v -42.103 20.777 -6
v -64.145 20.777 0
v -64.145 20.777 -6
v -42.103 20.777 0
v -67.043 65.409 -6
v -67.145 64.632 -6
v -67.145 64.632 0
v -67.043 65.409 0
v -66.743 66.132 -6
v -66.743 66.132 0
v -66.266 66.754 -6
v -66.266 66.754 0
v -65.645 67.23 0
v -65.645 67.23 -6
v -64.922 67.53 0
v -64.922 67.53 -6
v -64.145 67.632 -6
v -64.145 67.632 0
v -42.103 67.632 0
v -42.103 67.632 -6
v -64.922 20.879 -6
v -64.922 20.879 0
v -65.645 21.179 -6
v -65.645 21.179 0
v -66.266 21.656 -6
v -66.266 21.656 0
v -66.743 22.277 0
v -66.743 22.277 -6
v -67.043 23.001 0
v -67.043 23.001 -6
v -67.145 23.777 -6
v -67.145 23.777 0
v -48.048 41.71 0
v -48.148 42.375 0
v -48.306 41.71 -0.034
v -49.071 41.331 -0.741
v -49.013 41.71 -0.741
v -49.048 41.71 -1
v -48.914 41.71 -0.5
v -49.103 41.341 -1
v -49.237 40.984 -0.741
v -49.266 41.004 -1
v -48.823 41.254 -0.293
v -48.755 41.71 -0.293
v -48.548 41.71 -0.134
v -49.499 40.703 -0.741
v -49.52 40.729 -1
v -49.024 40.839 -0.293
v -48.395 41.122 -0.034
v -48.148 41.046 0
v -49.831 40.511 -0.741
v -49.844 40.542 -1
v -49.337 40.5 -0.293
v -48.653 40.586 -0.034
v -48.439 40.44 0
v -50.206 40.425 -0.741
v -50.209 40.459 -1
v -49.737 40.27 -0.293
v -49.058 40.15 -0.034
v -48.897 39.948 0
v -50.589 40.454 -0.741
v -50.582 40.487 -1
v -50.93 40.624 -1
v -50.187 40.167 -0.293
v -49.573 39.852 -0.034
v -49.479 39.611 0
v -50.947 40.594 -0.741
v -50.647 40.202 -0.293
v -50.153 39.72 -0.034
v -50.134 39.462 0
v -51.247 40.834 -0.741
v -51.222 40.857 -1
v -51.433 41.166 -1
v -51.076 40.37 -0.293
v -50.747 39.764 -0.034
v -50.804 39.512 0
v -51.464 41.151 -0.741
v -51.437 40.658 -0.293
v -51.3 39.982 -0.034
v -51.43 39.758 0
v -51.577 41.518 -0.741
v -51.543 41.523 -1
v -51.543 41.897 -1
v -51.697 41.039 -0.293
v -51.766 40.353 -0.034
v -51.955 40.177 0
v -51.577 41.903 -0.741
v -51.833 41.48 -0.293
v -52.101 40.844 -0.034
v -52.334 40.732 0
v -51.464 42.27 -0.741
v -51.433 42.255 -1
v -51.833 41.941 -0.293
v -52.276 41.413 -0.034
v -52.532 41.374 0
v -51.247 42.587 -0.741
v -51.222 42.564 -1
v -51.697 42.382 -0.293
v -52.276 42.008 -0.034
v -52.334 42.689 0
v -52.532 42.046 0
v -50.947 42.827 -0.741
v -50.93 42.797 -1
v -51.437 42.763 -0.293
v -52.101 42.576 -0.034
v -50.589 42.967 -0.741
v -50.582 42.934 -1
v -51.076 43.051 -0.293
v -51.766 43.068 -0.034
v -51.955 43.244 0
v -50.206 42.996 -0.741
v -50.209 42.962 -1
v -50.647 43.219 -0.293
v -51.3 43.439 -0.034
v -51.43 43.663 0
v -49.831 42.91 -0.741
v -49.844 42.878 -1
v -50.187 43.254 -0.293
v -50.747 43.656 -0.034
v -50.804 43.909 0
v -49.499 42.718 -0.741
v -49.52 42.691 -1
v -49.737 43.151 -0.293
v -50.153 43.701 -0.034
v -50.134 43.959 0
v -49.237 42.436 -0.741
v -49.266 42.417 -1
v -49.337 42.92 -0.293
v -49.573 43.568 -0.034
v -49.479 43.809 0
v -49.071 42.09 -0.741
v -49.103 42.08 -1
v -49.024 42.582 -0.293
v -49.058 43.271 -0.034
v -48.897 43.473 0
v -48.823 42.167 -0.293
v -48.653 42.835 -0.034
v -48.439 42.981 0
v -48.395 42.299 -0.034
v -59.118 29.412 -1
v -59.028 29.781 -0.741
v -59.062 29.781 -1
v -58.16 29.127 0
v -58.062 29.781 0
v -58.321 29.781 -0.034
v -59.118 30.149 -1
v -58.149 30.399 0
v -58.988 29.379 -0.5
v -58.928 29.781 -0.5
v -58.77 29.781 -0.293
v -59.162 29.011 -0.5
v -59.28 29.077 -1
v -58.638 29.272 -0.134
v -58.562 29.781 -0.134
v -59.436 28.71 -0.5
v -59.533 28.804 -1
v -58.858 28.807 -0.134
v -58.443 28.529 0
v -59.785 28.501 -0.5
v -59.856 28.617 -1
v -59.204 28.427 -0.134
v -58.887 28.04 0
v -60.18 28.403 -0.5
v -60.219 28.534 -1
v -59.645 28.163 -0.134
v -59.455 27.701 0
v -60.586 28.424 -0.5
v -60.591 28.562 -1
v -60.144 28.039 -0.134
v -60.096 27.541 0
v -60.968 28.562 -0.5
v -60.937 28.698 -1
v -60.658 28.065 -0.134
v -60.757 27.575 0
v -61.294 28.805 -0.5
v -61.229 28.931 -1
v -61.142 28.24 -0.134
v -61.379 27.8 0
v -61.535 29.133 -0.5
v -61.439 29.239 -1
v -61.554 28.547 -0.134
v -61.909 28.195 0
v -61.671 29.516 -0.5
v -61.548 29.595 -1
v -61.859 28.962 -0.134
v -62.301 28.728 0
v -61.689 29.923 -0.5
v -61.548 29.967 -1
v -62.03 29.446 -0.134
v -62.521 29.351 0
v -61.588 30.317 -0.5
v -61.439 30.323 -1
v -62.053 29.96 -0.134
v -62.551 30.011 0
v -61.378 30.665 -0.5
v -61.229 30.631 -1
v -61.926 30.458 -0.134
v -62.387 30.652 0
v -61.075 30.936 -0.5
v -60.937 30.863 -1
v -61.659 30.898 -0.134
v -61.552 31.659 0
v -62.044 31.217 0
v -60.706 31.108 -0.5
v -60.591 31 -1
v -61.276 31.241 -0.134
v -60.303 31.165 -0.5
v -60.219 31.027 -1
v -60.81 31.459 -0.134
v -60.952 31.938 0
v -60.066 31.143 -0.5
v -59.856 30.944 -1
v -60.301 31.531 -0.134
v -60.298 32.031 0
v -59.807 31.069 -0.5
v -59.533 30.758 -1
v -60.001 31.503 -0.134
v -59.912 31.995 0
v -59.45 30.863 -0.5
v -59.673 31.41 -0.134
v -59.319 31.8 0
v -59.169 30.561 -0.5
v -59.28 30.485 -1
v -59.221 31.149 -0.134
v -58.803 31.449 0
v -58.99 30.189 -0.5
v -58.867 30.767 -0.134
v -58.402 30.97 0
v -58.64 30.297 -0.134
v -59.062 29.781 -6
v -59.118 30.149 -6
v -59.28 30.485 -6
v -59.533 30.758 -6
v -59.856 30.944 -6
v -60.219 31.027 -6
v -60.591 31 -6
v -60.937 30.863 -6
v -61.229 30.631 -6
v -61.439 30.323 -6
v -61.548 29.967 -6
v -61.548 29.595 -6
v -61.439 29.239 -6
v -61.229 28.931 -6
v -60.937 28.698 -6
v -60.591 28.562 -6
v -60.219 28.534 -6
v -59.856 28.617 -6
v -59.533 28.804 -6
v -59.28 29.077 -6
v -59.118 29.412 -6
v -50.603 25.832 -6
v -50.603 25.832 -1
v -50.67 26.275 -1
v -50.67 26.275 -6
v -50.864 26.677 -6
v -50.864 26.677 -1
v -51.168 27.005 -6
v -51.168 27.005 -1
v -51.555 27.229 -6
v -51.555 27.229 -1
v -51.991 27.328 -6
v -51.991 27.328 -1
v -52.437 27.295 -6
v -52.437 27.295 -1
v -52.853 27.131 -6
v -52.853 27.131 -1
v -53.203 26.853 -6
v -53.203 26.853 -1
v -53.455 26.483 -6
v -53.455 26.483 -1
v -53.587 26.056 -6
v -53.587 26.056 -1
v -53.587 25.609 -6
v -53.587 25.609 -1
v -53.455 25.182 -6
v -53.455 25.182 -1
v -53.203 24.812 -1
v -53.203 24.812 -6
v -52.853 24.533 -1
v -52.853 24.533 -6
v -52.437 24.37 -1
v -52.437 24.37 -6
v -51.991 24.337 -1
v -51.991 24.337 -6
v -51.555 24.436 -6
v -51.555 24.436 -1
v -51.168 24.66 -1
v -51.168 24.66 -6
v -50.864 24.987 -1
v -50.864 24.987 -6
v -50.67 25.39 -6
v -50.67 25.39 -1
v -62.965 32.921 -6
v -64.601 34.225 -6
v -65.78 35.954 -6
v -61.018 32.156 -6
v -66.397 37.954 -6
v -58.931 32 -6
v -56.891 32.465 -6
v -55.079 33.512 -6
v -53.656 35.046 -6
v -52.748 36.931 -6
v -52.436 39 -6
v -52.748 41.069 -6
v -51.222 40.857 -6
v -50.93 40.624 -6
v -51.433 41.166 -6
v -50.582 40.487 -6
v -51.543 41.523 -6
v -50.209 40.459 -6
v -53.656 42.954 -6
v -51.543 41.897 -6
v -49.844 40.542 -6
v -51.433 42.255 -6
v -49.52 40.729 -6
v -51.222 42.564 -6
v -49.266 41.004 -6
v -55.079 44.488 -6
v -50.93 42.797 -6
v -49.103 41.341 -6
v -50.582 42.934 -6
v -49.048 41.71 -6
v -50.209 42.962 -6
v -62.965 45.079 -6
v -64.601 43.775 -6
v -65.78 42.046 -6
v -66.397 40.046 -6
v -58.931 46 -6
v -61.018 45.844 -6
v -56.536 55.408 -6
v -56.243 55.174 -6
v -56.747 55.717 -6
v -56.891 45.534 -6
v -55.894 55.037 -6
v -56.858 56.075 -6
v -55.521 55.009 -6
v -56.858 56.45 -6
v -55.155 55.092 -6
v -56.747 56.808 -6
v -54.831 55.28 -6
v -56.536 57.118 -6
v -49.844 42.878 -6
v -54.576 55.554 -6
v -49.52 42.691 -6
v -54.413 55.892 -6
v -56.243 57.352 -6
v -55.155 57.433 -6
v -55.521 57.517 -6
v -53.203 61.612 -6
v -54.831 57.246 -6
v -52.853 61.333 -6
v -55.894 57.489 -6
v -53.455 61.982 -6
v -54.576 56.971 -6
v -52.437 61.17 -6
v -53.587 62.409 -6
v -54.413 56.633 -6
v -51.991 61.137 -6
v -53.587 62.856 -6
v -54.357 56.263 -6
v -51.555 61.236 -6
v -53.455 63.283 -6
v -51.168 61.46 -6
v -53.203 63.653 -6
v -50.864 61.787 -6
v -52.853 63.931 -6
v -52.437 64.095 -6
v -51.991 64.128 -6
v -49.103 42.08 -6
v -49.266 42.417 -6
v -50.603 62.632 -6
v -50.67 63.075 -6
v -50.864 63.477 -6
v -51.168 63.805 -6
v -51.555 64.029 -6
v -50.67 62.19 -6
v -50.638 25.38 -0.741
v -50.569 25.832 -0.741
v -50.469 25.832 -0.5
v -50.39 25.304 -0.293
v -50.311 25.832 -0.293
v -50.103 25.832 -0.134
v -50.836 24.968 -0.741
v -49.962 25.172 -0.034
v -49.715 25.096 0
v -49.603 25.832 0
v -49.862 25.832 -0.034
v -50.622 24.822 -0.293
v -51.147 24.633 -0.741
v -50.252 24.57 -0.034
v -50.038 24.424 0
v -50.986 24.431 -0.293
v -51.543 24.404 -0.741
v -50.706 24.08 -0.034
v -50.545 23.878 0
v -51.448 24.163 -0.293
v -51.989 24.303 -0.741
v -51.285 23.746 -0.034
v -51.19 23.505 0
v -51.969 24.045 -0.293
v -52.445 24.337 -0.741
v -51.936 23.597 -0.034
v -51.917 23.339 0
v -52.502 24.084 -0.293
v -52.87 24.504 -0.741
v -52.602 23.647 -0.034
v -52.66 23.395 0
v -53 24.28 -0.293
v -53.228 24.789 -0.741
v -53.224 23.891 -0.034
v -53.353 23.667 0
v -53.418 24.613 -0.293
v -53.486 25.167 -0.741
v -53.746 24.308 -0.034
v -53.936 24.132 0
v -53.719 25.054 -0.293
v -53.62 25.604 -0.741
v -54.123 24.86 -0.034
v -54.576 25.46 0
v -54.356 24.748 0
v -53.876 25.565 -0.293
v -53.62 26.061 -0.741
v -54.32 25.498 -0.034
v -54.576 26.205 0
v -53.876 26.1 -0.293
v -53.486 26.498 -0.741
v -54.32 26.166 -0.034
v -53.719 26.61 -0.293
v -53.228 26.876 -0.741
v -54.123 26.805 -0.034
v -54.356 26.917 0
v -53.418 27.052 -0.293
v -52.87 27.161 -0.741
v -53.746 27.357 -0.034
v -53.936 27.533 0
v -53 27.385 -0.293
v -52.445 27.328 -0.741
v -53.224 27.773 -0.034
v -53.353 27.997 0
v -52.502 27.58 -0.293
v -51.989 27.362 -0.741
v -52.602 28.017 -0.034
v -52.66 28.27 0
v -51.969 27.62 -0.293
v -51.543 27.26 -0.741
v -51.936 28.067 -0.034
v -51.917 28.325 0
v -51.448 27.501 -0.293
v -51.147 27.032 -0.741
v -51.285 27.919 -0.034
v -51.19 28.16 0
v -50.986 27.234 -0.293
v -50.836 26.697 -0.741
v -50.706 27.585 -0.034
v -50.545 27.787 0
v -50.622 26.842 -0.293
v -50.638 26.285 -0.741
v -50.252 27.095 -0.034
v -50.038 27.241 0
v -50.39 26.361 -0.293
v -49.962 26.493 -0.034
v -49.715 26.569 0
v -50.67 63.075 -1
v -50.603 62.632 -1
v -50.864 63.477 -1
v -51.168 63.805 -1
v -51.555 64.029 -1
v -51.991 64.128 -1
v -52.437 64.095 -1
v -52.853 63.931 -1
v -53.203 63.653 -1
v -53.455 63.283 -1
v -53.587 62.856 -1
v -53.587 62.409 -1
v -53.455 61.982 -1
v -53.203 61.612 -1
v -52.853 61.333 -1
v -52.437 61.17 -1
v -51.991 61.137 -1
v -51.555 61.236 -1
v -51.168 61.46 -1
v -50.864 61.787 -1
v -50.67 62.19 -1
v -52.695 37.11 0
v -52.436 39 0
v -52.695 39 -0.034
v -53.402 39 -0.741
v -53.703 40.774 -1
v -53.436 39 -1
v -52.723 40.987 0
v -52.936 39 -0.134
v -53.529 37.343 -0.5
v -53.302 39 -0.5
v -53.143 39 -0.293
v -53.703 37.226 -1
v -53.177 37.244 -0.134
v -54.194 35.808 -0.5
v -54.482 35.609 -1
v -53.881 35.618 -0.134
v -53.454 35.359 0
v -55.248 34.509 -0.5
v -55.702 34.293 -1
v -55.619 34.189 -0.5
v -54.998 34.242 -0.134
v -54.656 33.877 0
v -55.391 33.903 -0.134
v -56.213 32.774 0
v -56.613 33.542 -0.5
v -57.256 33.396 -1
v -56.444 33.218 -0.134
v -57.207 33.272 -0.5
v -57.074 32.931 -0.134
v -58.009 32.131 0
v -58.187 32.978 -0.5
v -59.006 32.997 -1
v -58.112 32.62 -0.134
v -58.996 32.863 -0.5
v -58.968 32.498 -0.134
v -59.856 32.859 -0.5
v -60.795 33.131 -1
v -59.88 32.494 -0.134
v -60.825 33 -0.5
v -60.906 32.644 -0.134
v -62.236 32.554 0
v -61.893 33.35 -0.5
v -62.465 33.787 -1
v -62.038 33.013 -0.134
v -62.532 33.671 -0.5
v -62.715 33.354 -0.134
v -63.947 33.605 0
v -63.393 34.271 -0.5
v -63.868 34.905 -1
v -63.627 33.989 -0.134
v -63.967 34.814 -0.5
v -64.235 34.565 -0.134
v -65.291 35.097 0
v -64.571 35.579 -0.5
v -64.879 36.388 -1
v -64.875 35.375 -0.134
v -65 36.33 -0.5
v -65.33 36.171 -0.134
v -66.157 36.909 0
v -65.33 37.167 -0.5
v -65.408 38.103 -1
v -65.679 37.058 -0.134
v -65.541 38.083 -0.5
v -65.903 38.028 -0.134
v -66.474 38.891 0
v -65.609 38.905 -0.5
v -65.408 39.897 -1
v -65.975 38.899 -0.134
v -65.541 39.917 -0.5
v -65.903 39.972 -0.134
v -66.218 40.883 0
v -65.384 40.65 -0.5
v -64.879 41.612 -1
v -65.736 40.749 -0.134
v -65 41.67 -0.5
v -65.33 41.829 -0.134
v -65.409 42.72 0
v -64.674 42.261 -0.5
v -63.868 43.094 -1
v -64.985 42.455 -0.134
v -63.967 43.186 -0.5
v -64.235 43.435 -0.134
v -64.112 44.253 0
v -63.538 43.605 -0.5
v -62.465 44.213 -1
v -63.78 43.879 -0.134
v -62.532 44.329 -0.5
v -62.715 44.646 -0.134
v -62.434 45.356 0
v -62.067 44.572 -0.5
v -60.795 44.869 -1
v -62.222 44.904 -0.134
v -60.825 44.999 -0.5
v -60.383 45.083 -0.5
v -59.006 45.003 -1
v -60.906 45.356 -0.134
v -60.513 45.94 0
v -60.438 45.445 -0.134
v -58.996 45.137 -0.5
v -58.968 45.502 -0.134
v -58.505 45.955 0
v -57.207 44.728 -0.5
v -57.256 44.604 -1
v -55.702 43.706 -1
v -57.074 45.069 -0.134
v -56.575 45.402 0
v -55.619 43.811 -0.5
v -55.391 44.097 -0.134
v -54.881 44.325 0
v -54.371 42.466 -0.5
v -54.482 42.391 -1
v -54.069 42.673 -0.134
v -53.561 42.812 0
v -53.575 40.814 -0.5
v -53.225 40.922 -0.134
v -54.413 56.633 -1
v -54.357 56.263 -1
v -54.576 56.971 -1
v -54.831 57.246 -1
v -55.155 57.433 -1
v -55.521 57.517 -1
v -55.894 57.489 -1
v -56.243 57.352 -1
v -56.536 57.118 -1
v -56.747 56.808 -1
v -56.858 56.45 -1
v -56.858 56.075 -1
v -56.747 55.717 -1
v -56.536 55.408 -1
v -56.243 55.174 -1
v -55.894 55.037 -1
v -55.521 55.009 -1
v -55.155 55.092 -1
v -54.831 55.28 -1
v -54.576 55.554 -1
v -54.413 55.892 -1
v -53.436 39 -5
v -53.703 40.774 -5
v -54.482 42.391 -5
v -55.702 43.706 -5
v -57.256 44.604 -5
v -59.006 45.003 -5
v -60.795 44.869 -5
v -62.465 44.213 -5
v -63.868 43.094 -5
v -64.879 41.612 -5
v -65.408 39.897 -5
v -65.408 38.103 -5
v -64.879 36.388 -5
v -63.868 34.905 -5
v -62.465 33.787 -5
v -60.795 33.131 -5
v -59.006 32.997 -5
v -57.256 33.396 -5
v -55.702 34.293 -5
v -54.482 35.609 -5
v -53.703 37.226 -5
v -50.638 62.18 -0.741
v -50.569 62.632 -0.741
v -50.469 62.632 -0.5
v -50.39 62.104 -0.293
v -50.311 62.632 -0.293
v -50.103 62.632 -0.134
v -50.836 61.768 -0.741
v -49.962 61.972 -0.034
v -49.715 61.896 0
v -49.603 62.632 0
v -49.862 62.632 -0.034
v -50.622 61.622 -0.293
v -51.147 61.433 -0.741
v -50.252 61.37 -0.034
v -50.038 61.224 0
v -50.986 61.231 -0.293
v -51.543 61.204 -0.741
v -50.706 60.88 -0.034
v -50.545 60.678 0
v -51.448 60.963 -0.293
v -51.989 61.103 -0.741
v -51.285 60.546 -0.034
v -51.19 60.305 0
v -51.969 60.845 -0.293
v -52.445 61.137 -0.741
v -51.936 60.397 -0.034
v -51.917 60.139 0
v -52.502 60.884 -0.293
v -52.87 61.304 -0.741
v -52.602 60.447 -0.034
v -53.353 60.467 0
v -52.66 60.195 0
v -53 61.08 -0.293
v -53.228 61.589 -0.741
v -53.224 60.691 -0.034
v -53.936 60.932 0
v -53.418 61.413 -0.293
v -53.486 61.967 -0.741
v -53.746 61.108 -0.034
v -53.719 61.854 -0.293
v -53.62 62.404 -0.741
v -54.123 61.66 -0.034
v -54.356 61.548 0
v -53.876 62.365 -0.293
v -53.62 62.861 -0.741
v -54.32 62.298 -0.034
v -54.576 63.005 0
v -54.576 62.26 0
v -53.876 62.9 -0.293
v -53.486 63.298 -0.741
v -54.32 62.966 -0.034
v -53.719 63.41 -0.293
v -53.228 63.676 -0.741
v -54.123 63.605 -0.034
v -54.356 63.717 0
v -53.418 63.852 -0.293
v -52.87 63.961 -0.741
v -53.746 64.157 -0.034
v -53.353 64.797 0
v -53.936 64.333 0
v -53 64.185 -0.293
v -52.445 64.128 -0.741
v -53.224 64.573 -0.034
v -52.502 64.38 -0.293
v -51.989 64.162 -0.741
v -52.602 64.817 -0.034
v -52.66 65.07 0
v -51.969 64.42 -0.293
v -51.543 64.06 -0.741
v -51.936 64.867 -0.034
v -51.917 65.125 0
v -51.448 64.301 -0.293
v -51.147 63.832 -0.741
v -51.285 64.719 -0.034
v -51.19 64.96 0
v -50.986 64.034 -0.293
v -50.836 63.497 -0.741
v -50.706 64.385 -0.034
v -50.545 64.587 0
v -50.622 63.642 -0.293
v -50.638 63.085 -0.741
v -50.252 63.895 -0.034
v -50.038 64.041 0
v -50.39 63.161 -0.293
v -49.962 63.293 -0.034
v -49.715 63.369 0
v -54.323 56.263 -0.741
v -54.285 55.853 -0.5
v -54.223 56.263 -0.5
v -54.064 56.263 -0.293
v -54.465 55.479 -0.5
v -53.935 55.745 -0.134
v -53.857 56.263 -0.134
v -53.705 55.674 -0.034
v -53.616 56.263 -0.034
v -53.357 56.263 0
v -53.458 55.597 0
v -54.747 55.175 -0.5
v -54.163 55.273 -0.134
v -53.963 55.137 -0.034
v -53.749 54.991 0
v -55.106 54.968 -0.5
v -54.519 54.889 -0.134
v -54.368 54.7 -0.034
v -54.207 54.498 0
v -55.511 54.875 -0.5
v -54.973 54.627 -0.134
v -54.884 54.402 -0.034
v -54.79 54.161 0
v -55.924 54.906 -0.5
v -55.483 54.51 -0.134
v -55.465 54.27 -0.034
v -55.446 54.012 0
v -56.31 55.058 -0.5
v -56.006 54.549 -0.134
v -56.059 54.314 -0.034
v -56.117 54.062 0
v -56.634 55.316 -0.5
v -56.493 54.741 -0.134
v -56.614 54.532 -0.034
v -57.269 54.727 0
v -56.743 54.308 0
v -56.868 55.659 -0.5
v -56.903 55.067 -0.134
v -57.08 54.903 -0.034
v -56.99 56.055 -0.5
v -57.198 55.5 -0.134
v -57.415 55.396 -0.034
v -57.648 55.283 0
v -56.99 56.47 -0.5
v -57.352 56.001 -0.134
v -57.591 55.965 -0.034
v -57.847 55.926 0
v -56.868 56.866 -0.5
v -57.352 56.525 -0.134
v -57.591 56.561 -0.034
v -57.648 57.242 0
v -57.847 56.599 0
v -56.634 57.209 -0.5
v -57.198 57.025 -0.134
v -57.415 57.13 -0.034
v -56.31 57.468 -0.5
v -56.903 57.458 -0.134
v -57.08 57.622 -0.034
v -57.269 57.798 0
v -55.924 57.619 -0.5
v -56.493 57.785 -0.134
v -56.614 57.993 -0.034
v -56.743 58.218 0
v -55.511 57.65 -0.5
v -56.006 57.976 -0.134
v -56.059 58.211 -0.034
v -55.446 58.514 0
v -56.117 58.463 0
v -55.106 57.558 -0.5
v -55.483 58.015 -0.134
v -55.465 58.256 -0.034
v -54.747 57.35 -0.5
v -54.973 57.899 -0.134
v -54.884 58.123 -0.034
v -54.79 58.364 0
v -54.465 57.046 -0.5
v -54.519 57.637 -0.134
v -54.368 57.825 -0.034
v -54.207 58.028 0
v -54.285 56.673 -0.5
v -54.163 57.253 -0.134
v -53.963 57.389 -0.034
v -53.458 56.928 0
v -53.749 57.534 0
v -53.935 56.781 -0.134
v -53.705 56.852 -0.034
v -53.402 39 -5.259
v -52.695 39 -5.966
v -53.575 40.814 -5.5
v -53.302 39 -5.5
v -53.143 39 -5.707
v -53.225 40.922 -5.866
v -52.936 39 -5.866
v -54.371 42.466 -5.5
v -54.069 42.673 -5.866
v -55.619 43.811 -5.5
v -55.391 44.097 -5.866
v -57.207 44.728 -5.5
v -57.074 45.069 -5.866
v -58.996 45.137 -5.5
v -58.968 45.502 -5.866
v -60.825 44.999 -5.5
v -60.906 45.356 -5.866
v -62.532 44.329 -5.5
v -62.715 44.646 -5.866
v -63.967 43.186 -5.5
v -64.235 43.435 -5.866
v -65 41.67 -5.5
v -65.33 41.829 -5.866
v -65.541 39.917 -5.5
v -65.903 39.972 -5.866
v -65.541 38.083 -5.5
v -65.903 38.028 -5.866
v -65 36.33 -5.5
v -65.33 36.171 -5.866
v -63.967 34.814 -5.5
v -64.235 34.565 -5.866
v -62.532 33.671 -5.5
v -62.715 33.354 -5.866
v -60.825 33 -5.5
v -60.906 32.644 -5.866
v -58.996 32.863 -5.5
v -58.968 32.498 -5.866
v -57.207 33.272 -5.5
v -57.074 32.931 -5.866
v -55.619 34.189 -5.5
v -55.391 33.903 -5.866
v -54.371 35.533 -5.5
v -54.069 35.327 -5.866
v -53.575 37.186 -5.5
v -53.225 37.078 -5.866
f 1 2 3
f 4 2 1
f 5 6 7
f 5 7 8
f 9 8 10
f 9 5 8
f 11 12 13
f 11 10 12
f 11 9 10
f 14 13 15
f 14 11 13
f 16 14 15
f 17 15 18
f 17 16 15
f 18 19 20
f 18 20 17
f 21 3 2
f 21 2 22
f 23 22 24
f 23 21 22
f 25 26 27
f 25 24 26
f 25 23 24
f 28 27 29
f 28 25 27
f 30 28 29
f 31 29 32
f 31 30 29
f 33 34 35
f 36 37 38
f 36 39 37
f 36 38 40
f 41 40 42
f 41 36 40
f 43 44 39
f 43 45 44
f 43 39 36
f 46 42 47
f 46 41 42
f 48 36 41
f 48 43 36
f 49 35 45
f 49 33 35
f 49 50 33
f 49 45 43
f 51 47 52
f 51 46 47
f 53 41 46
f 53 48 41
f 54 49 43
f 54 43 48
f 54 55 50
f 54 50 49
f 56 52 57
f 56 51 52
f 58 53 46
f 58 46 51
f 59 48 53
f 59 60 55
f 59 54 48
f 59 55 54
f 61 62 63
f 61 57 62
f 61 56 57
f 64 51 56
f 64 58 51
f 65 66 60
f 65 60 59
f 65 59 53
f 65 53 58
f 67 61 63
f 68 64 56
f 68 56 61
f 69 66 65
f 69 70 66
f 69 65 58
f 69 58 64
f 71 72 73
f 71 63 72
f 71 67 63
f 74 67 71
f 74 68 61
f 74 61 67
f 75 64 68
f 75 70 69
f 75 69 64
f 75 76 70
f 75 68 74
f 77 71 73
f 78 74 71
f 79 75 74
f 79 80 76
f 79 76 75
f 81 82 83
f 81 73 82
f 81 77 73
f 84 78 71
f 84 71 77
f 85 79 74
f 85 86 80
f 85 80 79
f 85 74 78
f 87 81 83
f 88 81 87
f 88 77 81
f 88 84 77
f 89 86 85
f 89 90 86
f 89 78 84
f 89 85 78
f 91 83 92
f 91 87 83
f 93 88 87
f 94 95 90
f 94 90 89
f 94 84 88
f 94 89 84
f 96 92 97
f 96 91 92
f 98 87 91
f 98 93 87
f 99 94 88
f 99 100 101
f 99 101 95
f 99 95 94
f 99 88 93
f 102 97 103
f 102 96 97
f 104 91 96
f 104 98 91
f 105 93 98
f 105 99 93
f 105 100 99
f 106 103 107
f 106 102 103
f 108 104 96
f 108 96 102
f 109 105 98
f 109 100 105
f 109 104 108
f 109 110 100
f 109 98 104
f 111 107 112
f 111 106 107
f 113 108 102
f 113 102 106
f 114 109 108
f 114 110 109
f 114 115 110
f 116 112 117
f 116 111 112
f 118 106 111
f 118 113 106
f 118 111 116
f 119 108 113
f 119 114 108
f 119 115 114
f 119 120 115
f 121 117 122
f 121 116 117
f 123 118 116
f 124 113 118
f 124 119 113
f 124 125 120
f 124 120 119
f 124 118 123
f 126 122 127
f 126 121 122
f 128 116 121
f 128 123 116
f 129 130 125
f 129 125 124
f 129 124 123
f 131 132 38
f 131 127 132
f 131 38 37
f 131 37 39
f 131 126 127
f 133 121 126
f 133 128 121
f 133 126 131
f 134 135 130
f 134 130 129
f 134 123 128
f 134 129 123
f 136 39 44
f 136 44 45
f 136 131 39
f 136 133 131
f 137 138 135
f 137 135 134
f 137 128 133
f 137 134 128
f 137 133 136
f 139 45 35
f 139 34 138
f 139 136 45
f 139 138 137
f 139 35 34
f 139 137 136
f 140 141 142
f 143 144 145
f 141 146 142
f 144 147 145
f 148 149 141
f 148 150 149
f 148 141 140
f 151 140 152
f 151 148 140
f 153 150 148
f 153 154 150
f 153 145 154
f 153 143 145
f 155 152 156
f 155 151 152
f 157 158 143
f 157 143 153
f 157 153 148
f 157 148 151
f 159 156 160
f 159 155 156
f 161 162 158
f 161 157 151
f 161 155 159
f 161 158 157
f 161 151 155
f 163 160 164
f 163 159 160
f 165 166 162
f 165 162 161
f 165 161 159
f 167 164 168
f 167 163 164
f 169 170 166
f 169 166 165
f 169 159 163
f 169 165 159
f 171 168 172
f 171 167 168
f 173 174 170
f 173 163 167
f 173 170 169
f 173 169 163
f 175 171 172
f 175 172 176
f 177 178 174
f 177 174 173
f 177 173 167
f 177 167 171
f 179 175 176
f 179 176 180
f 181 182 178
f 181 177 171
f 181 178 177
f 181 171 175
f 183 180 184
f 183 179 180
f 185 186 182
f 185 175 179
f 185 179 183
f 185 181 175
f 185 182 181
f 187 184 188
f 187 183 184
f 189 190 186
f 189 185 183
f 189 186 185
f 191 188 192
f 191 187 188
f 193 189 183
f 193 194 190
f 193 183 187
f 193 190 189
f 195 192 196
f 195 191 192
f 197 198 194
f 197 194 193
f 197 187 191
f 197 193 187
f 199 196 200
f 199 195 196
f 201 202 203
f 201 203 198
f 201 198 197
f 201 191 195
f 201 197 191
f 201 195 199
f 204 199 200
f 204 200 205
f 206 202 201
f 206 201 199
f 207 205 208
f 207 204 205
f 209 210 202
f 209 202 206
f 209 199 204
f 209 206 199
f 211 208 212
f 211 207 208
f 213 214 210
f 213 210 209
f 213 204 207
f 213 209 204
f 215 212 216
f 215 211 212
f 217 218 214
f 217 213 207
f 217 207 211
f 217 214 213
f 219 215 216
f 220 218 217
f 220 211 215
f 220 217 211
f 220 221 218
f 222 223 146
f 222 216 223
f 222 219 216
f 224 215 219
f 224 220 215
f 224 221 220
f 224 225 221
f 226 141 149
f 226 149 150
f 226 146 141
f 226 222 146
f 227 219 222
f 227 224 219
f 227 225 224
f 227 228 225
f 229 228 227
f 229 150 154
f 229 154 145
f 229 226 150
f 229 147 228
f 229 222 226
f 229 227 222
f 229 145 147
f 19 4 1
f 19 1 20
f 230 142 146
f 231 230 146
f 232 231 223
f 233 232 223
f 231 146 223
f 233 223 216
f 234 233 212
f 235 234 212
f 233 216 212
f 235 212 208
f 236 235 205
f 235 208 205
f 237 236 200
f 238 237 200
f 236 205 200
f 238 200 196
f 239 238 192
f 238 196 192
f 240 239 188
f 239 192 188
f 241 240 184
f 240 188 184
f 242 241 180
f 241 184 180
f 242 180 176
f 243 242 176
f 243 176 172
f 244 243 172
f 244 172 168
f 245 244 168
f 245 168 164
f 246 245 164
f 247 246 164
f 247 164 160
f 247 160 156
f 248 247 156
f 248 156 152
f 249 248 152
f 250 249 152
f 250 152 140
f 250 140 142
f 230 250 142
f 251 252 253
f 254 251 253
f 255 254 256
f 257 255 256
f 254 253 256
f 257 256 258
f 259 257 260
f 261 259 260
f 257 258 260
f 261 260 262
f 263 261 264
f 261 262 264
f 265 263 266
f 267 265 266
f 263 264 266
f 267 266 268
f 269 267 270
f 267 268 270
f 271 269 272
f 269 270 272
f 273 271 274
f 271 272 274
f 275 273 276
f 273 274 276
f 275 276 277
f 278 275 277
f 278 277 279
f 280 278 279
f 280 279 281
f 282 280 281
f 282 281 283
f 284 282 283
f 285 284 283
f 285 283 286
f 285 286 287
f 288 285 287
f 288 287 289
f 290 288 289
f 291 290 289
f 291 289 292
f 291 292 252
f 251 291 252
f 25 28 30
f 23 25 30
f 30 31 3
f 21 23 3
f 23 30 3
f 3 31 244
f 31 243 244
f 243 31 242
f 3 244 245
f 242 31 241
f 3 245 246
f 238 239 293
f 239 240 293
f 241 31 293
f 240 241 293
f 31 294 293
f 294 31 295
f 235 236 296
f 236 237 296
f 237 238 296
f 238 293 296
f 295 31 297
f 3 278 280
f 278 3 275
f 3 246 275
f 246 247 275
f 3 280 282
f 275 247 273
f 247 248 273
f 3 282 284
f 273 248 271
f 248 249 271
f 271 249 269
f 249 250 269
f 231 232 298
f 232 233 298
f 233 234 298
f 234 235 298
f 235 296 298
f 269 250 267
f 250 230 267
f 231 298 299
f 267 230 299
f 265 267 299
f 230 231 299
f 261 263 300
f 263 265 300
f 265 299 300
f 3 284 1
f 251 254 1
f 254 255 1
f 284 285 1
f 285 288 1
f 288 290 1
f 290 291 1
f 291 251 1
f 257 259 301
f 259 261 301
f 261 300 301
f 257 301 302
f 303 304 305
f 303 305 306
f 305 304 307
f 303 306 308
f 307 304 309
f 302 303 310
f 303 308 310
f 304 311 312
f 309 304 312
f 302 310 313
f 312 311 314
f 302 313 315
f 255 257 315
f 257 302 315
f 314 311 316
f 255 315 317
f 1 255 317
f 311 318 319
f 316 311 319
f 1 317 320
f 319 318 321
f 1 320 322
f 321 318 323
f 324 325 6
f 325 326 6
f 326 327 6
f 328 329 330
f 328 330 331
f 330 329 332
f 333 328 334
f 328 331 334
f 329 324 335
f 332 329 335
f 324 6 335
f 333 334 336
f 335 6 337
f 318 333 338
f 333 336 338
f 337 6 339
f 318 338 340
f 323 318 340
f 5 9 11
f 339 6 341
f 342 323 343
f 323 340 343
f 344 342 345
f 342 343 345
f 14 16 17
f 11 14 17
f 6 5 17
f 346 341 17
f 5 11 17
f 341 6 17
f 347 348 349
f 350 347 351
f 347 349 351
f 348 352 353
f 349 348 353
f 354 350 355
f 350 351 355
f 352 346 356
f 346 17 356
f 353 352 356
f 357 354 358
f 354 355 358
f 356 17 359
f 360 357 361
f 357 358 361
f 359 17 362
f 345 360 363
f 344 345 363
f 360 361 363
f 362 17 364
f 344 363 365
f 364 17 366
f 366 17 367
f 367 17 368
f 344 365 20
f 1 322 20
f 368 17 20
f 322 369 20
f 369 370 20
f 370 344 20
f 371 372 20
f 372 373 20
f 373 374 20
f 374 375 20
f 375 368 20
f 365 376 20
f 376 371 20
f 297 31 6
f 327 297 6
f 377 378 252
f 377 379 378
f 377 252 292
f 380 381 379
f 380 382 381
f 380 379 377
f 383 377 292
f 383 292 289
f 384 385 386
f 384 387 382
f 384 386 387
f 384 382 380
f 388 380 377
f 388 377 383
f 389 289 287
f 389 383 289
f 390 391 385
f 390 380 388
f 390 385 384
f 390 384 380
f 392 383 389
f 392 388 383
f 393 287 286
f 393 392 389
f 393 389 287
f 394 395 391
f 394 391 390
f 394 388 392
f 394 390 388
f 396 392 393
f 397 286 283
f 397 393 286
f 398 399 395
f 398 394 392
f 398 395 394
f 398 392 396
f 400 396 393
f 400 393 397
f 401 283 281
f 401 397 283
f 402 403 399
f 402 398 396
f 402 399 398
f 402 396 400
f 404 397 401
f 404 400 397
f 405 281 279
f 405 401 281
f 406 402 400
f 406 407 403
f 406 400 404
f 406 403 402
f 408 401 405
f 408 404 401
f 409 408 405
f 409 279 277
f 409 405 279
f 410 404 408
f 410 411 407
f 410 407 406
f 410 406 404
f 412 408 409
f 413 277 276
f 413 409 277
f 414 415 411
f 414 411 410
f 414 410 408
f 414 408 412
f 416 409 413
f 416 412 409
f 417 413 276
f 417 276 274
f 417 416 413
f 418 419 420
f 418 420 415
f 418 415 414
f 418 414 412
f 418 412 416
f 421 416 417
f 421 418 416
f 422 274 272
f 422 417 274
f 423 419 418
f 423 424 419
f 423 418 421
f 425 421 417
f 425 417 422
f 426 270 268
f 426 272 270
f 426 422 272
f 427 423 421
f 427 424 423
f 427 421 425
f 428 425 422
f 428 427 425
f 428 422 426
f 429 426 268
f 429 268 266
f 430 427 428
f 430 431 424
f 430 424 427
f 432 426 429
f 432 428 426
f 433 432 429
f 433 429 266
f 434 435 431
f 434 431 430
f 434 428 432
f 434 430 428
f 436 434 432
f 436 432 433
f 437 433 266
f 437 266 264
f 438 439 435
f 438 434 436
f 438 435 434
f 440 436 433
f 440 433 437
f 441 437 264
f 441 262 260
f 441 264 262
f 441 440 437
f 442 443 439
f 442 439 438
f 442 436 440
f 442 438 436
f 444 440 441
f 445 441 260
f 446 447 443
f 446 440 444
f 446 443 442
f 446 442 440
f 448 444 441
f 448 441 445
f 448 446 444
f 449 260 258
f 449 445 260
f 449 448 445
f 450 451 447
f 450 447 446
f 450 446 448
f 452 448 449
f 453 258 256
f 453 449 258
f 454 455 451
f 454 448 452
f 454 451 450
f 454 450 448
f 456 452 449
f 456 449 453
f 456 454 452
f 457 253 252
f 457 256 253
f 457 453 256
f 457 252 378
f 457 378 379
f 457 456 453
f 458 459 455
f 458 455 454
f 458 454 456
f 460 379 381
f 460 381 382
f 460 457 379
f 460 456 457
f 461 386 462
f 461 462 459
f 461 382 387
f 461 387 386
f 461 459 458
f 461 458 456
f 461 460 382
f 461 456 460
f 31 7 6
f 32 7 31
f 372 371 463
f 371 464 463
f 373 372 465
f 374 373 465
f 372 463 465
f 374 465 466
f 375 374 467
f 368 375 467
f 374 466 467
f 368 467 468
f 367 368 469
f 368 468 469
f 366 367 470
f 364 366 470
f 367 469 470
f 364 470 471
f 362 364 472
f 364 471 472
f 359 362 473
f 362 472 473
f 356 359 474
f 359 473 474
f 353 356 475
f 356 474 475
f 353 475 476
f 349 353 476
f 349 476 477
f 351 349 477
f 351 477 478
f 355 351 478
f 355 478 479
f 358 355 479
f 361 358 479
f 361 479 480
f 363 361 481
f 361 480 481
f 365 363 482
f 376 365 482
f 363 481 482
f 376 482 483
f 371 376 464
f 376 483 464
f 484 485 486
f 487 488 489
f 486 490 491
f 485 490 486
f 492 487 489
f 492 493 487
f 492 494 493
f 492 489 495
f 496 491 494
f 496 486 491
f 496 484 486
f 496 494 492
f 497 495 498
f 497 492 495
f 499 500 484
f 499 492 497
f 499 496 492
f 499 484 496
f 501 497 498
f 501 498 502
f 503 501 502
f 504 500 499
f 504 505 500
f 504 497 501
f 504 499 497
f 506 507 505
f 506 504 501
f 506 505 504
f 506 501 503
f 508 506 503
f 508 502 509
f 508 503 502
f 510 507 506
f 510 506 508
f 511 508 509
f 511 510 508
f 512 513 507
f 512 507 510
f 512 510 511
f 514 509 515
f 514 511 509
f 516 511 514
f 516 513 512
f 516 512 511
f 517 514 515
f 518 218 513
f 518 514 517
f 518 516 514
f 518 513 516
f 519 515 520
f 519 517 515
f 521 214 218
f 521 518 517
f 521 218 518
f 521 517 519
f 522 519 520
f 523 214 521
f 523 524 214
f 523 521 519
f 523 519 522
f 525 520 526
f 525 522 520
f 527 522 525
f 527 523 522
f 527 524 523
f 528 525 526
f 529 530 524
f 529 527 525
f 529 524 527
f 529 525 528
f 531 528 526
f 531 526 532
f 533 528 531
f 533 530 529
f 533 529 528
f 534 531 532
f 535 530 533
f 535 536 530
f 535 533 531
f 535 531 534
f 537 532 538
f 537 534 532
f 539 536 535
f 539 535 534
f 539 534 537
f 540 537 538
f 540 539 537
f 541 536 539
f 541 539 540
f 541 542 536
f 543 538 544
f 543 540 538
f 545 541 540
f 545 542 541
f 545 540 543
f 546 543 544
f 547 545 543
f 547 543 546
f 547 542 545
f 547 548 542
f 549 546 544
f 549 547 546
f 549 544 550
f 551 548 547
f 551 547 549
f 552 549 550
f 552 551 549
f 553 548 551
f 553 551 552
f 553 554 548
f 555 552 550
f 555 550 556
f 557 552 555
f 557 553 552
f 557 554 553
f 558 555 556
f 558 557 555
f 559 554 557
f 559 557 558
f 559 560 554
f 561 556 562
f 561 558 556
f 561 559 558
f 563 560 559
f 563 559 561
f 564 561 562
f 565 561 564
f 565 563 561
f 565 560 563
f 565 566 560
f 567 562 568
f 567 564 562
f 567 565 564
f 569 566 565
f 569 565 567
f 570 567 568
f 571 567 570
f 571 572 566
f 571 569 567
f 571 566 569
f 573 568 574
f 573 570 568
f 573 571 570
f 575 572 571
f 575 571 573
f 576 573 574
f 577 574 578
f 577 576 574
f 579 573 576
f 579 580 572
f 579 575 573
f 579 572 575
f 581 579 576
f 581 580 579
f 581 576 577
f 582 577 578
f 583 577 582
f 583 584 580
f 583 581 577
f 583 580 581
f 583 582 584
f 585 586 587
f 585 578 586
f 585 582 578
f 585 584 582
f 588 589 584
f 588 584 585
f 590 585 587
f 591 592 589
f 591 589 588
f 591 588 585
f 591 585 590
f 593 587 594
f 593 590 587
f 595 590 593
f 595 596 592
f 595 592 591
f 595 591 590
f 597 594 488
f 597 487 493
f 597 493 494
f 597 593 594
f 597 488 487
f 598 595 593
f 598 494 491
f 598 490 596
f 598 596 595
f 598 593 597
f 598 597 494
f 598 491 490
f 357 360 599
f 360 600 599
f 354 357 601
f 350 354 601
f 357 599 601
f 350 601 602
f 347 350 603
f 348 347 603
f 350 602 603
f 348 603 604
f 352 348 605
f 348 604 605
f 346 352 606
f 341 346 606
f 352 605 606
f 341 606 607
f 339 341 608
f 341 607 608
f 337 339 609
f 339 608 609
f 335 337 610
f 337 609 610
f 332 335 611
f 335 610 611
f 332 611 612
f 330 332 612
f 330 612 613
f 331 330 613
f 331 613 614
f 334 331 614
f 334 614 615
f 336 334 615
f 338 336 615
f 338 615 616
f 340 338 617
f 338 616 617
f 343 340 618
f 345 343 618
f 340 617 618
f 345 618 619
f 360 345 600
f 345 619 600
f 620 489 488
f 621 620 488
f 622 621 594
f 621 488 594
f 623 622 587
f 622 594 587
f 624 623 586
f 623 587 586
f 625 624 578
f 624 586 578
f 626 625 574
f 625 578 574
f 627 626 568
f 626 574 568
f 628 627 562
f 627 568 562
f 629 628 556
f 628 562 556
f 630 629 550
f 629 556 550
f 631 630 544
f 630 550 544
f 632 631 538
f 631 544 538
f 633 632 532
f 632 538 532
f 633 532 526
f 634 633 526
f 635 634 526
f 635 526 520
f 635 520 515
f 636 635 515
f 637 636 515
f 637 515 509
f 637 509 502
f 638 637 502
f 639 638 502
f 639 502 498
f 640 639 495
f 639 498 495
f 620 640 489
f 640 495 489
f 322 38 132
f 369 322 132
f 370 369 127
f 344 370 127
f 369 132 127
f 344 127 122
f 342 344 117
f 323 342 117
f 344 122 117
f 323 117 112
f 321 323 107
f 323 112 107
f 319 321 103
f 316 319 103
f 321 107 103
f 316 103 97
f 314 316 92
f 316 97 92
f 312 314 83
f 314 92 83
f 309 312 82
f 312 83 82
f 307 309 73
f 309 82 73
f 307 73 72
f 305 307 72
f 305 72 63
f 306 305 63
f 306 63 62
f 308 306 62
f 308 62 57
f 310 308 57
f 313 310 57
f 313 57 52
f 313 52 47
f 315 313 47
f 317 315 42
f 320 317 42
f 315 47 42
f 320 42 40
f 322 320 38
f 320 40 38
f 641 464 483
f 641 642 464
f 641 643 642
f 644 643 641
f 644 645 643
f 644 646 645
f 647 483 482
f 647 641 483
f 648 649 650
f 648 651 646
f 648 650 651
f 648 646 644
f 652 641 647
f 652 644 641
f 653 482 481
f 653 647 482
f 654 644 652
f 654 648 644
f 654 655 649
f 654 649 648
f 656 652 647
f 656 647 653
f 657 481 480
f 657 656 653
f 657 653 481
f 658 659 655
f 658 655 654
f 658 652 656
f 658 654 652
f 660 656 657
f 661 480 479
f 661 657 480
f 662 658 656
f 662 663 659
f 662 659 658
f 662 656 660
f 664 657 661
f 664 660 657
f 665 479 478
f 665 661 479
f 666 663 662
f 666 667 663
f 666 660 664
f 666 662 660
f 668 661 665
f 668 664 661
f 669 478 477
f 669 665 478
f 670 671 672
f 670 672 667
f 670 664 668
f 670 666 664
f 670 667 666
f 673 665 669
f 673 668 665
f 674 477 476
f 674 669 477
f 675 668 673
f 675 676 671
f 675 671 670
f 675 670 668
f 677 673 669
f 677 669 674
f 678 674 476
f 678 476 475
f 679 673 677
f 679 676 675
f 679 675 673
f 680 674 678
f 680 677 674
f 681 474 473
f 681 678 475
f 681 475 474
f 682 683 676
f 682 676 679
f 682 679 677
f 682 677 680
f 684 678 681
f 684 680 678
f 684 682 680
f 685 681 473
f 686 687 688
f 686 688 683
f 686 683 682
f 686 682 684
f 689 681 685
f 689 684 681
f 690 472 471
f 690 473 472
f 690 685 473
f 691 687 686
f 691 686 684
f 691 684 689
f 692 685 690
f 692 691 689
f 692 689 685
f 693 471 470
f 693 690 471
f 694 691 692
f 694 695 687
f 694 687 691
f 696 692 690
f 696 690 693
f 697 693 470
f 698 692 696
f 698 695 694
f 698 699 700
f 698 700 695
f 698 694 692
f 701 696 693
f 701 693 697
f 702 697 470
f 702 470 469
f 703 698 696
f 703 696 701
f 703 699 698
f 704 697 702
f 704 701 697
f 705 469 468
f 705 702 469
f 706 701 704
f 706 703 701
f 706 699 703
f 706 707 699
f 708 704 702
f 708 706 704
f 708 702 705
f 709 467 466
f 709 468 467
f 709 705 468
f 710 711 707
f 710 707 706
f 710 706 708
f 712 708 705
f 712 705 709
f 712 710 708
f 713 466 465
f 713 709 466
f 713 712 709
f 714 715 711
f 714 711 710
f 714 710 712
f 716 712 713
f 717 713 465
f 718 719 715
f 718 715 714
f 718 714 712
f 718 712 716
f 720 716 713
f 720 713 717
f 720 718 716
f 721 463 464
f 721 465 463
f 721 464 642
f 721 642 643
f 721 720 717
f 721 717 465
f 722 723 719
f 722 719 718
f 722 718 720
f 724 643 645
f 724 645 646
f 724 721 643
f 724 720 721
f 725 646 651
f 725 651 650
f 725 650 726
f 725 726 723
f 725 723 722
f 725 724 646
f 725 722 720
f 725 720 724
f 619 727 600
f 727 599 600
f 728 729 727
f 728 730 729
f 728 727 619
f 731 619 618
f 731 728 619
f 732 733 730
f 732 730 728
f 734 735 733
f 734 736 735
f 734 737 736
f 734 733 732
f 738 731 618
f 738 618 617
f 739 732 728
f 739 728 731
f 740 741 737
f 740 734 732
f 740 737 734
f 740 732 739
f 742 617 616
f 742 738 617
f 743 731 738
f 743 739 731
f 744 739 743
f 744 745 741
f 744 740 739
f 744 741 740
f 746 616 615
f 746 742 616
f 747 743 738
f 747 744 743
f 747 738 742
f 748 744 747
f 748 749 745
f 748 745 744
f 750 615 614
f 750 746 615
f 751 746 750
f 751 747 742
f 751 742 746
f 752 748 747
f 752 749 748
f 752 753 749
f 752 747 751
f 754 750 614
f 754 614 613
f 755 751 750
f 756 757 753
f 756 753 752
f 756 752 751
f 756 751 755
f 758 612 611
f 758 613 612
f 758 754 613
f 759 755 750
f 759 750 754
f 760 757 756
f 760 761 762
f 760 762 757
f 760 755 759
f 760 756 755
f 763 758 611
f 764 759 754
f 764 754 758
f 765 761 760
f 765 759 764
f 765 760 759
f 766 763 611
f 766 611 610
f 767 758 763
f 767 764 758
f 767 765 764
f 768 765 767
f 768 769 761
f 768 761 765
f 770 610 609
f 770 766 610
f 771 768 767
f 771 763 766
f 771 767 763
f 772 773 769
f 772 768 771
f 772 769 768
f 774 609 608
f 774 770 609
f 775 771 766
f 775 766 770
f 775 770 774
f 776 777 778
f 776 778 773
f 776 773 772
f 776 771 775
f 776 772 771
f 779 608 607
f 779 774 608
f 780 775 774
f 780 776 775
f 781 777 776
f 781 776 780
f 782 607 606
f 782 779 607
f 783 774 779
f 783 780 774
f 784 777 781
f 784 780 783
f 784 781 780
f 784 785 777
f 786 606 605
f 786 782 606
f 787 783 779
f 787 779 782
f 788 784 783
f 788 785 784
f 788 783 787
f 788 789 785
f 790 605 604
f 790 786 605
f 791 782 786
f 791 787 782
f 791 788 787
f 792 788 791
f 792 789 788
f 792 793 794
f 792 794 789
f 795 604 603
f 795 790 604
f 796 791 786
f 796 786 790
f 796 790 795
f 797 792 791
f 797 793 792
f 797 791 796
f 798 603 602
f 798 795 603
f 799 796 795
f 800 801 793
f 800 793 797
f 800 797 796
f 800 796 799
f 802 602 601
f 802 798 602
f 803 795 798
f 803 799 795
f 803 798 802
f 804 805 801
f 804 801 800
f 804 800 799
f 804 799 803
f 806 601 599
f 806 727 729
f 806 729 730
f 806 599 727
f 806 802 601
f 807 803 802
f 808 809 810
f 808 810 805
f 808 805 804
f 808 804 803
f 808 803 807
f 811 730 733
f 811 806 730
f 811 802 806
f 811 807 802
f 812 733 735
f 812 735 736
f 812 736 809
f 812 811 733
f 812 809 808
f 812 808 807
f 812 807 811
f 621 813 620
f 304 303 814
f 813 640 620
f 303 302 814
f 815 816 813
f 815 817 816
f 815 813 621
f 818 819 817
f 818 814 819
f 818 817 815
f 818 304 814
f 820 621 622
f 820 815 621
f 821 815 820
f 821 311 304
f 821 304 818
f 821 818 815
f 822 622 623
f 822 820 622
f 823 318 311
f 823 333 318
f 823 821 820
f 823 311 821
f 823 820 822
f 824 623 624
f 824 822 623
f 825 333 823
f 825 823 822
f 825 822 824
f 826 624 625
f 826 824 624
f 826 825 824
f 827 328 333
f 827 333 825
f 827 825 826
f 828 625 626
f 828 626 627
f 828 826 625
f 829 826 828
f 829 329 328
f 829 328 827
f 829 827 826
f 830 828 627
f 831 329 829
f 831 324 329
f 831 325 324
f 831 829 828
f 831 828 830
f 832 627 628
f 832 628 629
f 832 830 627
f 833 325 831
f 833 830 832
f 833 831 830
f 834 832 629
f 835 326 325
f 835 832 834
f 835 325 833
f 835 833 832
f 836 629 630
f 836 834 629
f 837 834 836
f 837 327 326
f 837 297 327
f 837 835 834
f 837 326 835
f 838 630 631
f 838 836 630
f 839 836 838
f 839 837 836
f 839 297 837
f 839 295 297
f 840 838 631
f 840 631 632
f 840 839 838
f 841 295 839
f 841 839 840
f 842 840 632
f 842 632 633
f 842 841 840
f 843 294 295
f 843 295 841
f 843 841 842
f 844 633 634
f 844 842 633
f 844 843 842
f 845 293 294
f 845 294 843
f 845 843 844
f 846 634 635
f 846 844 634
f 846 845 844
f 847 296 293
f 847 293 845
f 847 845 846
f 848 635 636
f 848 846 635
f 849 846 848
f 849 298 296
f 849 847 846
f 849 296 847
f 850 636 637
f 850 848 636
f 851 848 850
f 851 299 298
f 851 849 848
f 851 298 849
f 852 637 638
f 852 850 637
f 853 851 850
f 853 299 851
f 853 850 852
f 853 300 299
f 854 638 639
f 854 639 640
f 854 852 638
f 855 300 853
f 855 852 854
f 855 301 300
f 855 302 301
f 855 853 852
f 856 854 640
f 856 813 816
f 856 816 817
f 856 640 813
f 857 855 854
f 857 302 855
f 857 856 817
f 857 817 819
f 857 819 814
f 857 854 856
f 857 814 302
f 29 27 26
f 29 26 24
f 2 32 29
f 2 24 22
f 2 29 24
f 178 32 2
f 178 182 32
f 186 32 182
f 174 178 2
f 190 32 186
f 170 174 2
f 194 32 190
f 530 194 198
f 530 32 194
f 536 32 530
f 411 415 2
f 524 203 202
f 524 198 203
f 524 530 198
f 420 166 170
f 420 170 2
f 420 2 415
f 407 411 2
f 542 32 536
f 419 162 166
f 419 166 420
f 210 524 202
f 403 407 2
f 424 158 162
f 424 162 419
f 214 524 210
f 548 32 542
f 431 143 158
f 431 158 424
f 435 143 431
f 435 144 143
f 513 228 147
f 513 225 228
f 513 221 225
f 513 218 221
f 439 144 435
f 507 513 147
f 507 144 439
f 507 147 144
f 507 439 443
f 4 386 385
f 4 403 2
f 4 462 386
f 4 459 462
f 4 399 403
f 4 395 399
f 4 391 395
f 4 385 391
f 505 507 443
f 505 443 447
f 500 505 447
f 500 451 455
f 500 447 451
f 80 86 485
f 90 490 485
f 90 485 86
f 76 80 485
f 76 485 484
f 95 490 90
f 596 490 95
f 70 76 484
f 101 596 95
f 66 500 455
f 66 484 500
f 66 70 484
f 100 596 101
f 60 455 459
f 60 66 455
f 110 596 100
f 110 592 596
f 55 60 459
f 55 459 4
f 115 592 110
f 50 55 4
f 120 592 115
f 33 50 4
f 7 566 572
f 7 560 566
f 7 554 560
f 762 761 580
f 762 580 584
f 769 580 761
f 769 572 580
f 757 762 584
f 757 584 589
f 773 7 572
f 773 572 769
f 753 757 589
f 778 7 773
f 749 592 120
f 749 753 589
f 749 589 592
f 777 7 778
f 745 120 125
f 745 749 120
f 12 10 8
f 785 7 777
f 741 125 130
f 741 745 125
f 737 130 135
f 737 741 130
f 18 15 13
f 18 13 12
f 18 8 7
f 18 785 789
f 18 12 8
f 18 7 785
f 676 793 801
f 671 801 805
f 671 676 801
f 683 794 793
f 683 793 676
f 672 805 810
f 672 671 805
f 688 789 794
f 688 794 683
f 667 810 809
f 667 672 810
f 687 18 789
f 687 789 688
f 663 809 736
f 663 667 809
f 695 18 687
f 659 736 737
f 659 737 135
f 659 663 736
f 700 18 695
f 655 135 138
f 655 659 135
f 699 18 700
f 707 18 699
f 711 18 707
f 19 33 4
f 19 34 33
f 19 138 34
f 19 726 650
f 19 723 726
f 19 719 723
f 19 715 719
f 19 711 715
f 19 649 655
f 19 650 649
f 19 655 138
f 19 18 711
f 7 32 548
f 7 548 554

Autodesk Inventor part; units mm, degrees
ref_plane "YZ Plane" through (0, 0, 0) normal (1, 0, 0) x (0, 1, 0)
ref_plane "XZ Plane" through (0, 0, 0) normal (0, 1, 0) x (-1, 0, 0)
ref_plane "XY Plane" through (0, 0, 0) normal (0, 0, 1) x (1, 0, 0)
sketch "Sketch1" plane through (0, 0, 0) normal (0, 0, 1) x (1, 0, 0)
  line L0 (-42.103451, 25.832396) -> (-42.103451, 67.632396)
  line L1 (-42.103451, 67.632396) -> (-67.145108, 67.632396)
  line L2 (-67.145108, 67.632396) -> (-67.145108, 20.777189)
  line L3 (-67.145108, 20.777189) -> (-42.103451, 20.777189)
  line L4 (-42.103451, 20.777189) -> (-42.103451, 67.632396)
  line L5 (-42.103451, 67.632396) -> (-64.103451, 67.632396)
  line L6 (-42.103451, 67.632396) -> (-42.103451, 62.632396)
  line L7 (-42.103451, 36.232396) -> (-42.103451, 20.832396)
  line L8 (-42.103451, 20.832396) -> (-42.103451, 25.832396)
  circle A0 centre (-52.103451, 62.632396) radius 1.5
  circle A1 centre (-52.103451, 25.832396) radius 1.5
  arc A2 (-67.103451, 26.001195) -> (-67.103451, 62.678375) centre (-65.601409, 44.339785) ccw
  circle A3 centre (-65.613731, 44.346133) radius 18.4
  circle A4 centre (-75.593787, 32.452366) radius 0.975975
  circle A5 centre (-60.312419, 29.780898) radius 1.25
  circle A6 centre (-60.312419, 29.780898) radius 1.25
  circle A7 centre (-75.593787, 32.452366) radius 0.975975
  circle A8 centre (-80.878251, 47.03768) radius 1.25
  circle A9 centre (-80.878251, 47.03768) radius 1.25
  circle A10 centre (-70.868197, 58.967198) radius 1.013606
  circle A11 centre (-50.302365, 41.710416) radius 1.254816
  circle A12 centre (-59.45554, 38.999939) radius 6.0198
  circle A13 centre (-55.614516, 56.262734) radius 1.2573
  point P0 (0, 0)
  point P1 (-62.028451, 25.832396)
  point P2 (-78.421274, 29.082698)
sketch "Sketch1 outline for Extrusion1" plane through (0, 0, 0) normal (0, 0, 1) x (1, 0, 0)
  line L0 (-67.145108, 67.632396) -> (-67.145108, 20.777189)
  line L1 (-42.103451, 67.632396) -> (-67.145108, 67.632396)
  line L2 (-67.145108, 20.777189) -> (-42.103451, 20.777189)
  line L3 (-42.103451, 25.832396) -> (-42.103451, 67.632396)
  line L4 (-42.103451, 20.777189) -> (-42.103451, 25.832396)
  circle A0 centre (-60.312419, 29.780898) radius 1.25
  circle A1 centre (-59.45554, 38.999939) radius 6.0198
  circle A2 centre (-52.103451, 25.832396) radius 1.5
  circle A3 centre (-50.302365, 41.710416) radius 1.254816
  circle A4 centre (-55.614516, 56.262734) radius 1.2573
  circle A5 centre (-52.103451, 62.632396) radius 1.5
extrude "Extrusion1" add sketch "Sketch1 outline for Extrusion1" against normal blind 6
fillet "Fillet1" radius 1 7 edges at (-53.6035, 62.6324, 0) (-56.8718, 56.2627, 0) (-51.5572, 41.7104, 0) (-53.6035, 25.8324, 0) (-61.5624, 29.7809, 0) (-65.4753, 38.9999, -6) (-65.4753, 38.9999, 0)
fillet "Fillet2" radius 3 2 edges at (-67.1451, 67.6324, -3) (-67.1451, 20.7772, -3)
properties part number "Tapa motor"
